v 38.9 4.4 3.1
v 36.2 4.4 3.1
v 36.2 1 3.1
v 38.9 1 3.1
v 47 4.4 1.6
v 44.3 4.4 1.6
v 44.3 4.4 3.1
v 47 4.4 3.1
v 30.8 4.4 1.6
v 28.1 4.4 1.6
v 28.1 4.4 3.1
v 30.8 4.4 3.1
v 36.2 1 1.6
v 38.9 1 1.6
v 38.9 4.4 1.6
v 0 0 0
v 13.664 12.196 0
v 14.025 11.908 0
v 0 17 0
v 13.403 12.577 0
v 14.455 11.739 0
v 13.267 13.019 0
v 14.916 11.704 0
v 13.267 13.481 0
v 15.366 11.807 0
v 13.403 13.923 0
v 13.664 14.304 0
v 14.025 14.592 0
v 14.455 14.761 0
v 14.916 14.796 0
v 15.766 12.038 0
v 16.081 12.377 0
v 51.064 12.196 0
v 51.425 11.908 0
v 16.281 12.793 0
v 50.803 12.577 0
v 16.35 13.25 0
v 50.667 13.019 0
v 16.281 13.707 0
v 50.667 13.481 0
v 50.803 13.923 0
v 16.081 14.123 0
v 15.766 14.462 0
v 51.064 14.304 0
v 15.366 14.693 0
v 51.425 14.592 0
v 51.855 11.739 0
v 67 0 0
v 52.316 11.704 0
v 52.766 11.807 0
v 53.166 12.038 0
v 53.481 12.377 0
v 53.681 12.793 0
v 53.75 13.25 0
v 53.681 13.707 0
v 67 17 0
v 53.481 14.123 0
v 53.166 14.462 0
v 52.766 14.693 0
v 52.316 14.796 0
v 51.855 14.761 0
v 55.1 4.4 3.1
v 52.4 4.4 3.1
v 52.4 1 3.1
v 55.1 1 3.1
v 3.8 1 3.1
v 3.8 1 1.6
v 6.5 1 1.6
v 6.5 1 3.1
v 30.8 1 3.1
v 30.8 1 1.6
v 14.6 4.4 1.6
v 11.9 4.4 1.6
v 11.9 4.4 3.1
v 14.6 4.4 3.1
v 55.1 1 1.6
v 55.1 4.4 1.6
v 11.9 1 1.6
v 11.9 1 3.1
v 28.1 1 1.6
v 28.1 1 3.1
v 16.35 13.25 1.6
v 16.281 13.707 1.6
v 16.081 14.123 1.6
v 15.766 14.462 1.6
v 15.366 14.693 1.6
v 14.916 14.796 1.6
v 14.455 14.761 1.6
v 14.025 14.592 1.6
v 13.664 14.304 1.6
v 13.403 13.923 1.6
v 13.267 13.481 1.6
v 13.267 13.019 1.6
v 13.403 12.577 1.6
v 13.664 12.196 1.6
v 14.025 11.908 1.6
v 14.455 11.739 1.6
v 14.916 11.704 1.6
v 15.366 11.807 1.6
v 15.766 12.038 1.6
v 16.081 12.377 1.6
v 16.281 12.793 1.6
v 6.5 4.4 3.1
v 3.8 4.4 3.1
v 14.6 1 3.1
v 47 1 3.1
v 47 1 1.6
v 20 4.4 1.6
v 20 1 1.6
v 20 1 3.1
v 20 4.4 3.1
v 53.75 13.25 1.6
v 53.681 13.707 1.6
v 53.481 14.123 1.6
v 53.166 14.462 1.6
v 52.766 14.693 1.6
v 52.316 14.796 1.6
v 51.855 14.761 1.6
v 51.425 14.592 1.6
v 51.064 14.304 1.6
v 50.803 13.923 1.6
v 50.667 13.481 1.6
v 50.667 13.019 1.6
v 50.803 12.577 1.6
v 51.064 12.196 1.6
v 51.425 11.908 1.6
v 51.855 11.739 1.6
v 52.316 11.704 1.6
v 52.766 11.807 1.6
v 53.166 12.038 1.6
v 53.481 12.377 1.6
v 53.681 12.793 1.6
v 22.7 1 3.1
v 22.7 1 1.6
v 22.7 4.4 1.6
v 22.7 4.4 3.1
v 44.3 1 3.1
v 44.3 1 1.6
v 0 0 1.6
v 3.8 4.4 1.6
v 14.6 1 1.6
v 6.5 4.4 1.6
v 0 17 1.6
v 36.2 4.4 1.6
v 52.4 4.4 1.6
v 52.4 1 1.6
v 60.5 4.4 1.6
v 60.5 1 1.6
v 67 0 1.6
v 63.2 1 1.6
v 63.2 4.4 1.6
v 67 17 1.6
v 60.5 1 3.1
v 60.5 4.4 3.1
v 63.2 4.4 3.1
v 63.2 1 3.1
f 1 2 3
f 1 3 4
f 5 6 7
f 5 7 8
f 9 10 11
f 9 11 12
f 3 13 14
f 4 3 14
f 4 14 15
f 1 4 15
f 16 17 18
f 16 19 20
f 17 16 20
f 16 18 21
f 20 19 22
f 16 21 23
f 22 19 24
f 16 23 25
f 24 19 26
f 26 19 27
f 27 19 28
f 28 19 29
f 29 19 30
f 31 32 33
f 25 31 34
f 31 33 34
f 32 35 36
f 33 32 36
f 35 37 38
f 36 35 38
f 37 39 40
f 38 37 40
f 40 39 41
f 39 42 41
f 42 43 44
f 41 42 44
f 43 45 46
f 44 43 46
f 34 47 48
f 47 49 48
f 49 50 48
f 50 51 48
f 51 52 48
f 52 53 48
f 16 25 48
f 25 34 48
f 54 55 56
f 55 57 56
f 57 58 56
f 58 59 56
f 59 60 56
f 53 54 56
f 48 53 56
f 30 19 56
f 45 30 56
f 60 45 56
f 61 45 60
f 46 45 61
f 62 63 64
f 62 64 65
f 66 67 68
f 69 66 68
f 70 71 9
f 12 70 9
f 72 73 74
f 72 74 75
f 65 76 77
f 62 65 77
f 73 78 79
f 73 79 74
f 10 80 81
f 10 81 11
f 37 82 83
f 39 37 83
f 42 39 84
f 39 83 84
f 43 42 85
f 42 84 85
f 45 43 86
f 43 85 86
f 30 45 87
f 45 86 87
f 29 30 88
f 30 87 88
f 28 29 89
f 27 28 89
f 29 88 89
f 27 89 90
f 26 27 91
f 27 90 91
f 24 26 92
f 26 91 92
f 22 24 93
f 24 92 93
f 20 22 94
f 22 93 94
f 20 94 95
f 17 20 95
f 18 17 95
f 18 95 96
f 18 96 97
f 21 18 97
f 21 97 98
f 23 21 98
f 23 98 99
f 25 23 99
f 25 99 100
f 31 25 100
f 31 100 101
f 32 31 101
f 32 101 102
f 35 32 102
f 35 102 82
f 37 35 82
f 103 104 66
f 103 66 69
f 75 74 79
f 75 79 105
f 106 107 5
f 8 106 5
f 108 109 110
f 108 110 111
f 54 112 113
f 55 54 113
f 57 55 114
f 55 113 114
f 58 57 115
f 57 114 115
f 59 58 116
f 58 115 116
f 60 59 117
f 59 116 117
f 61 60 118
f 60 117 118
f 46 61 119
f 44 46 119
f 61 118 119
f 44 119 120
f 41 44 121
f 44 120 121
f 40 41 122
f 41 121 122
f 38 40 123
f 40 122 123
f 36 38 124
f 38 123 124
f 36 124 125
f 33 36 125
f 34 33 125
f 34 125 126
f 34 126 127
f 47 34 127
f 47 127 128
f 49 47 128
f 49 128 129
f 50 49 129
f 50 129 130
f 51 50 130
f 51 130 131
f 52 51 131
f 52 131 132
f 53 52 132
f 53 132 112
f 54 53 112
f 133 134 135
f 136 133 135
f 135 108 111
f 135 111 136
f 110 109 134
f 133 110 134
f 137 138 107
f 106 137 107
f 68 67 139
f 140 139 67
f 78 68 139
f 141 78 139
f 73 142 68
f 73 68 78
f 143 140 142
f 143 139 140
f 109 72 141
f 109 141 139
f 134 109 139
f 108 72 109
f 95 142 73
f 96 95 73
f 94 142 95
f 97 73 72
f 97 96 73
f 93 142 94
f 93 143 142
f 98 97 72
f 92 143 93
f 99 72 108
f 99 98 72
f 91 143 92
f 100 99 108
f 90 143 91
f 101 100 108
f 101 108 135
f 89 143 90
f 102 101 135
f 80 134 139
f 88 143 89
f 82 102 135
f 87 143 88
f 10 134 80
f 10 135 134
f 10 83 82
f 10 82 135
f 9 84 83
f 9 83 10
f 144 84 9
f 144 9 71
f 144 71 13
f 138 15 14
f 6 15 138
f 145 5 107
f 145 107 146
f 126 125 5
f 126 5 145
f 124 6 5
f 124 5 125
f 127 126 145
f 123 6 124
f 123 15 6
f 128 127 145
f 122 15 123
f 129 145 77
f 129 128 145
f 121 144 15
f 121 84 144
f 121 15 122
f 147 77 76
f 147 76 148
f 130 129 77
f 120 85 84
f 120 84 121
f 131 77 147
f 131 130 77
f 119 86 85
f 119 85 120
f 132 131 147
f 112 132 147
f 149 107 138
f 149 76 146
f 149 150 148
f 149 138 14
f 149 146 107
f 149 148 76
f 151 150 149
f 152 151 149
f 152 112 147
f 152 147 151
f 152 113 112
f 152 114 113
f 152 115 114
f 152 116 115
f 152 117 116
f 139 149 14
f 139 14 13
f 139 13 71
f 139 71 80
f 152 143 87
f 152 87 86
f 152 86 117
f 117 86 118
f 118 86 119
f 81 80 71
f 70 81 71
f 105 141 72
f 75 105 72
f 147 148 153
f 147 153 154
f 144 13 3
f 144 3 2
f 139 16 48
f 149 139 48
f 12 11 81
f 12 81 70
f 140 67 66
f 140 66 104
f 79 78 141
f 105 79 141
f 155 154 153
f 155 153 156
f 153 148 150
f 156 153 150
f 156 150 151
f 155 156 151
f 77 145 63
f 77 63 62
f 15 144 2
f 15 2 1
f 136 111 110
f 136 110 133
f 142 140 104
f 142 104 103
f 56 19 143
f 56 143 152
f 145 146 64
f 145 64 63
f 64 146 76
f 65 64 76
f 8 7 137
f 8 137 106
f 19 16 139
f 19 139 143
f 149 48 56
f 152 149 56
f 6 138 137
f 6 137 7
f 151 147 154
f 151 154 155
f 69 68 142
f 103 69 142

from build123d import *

# Parameters (mm, degrees)
ESBO_O1_W                = 67
ESBO_O1_H                = 17
RESSALTO_EXTRUS_O1_DEPTH = 1.6
ESBO_O2_R                = 1.55
CORTE_EXTRUS_O1_DEPTH    = 70.141593849
ESBO_O3_W                = 2.7
ESBO_O3_H                = 3.4
RESSALTO_EXTRUS_O2_DEPTH = 1.5


with BuildPart() as part:
    # Esboço1 → Ressalto-extrusão1 (new body)
    with BuildSketch(Plane.XY):
        with Locations((33.5, 8.5)):
            Rectangle(ESBO_O1_W, ESBO_O1_H)
    extrude(amount=RESSALTO_EXTRUS_O1_DEPTH)

    # Esboço2 → Corte-extrusão1 (cut, through all)
    with BuildSketch(Plane.XY.offset(1.6)):
        with Locations((14.8, 13.25)):
            Circle(ESBO_O2_R)
        with Locations((52.2, 13.25)):
            Circle(ESBO_O2_R)
    extrude(amount=-CORTE_EXTRUS_O1_DEPTH, mode=Mode.SUBTRACT)

    # Esboço3 → Ressalto-extrusão2 (add)
    with BuildSketch(Plane.XY.offset(1.6)):
        with Locations((5.15, 2.7)):
            Rectangle(ESBO_O3_W, ESBO_O3_H)
        with Locations((13.25, 2.7)):
            Rectangle(ESBO_O3_W, ESBO_O3_H)
        with Locations((21.35, 2.7)):
            Rectangle(ESBO_O3_W, ESBO_O3_H)
        with Locations((29.45, 2.7)):
            Rectangle(ESBO_O3_W, ESBO_O3_H)
        with Locations((37.55, 2.7)):
            Rectangle(ESBO_O3_W, ESBO_O3_H)
        with Locations((45.65, 2.7)):
            Rectangle(ESBO_O3_W, ESBO_O3_H)
        with Locations((53.75, 2.7)):
            Rectangle(ESBO_O3_W, ESBO_O3_H)
        with Locations((61.85, 2.7)):
            Rectangle(ESBO_O3_W, ESBO_O3_H)
    extrude(amount=RESSALTO_EXTRUS_O2_DEPTH)


solid = part.part
